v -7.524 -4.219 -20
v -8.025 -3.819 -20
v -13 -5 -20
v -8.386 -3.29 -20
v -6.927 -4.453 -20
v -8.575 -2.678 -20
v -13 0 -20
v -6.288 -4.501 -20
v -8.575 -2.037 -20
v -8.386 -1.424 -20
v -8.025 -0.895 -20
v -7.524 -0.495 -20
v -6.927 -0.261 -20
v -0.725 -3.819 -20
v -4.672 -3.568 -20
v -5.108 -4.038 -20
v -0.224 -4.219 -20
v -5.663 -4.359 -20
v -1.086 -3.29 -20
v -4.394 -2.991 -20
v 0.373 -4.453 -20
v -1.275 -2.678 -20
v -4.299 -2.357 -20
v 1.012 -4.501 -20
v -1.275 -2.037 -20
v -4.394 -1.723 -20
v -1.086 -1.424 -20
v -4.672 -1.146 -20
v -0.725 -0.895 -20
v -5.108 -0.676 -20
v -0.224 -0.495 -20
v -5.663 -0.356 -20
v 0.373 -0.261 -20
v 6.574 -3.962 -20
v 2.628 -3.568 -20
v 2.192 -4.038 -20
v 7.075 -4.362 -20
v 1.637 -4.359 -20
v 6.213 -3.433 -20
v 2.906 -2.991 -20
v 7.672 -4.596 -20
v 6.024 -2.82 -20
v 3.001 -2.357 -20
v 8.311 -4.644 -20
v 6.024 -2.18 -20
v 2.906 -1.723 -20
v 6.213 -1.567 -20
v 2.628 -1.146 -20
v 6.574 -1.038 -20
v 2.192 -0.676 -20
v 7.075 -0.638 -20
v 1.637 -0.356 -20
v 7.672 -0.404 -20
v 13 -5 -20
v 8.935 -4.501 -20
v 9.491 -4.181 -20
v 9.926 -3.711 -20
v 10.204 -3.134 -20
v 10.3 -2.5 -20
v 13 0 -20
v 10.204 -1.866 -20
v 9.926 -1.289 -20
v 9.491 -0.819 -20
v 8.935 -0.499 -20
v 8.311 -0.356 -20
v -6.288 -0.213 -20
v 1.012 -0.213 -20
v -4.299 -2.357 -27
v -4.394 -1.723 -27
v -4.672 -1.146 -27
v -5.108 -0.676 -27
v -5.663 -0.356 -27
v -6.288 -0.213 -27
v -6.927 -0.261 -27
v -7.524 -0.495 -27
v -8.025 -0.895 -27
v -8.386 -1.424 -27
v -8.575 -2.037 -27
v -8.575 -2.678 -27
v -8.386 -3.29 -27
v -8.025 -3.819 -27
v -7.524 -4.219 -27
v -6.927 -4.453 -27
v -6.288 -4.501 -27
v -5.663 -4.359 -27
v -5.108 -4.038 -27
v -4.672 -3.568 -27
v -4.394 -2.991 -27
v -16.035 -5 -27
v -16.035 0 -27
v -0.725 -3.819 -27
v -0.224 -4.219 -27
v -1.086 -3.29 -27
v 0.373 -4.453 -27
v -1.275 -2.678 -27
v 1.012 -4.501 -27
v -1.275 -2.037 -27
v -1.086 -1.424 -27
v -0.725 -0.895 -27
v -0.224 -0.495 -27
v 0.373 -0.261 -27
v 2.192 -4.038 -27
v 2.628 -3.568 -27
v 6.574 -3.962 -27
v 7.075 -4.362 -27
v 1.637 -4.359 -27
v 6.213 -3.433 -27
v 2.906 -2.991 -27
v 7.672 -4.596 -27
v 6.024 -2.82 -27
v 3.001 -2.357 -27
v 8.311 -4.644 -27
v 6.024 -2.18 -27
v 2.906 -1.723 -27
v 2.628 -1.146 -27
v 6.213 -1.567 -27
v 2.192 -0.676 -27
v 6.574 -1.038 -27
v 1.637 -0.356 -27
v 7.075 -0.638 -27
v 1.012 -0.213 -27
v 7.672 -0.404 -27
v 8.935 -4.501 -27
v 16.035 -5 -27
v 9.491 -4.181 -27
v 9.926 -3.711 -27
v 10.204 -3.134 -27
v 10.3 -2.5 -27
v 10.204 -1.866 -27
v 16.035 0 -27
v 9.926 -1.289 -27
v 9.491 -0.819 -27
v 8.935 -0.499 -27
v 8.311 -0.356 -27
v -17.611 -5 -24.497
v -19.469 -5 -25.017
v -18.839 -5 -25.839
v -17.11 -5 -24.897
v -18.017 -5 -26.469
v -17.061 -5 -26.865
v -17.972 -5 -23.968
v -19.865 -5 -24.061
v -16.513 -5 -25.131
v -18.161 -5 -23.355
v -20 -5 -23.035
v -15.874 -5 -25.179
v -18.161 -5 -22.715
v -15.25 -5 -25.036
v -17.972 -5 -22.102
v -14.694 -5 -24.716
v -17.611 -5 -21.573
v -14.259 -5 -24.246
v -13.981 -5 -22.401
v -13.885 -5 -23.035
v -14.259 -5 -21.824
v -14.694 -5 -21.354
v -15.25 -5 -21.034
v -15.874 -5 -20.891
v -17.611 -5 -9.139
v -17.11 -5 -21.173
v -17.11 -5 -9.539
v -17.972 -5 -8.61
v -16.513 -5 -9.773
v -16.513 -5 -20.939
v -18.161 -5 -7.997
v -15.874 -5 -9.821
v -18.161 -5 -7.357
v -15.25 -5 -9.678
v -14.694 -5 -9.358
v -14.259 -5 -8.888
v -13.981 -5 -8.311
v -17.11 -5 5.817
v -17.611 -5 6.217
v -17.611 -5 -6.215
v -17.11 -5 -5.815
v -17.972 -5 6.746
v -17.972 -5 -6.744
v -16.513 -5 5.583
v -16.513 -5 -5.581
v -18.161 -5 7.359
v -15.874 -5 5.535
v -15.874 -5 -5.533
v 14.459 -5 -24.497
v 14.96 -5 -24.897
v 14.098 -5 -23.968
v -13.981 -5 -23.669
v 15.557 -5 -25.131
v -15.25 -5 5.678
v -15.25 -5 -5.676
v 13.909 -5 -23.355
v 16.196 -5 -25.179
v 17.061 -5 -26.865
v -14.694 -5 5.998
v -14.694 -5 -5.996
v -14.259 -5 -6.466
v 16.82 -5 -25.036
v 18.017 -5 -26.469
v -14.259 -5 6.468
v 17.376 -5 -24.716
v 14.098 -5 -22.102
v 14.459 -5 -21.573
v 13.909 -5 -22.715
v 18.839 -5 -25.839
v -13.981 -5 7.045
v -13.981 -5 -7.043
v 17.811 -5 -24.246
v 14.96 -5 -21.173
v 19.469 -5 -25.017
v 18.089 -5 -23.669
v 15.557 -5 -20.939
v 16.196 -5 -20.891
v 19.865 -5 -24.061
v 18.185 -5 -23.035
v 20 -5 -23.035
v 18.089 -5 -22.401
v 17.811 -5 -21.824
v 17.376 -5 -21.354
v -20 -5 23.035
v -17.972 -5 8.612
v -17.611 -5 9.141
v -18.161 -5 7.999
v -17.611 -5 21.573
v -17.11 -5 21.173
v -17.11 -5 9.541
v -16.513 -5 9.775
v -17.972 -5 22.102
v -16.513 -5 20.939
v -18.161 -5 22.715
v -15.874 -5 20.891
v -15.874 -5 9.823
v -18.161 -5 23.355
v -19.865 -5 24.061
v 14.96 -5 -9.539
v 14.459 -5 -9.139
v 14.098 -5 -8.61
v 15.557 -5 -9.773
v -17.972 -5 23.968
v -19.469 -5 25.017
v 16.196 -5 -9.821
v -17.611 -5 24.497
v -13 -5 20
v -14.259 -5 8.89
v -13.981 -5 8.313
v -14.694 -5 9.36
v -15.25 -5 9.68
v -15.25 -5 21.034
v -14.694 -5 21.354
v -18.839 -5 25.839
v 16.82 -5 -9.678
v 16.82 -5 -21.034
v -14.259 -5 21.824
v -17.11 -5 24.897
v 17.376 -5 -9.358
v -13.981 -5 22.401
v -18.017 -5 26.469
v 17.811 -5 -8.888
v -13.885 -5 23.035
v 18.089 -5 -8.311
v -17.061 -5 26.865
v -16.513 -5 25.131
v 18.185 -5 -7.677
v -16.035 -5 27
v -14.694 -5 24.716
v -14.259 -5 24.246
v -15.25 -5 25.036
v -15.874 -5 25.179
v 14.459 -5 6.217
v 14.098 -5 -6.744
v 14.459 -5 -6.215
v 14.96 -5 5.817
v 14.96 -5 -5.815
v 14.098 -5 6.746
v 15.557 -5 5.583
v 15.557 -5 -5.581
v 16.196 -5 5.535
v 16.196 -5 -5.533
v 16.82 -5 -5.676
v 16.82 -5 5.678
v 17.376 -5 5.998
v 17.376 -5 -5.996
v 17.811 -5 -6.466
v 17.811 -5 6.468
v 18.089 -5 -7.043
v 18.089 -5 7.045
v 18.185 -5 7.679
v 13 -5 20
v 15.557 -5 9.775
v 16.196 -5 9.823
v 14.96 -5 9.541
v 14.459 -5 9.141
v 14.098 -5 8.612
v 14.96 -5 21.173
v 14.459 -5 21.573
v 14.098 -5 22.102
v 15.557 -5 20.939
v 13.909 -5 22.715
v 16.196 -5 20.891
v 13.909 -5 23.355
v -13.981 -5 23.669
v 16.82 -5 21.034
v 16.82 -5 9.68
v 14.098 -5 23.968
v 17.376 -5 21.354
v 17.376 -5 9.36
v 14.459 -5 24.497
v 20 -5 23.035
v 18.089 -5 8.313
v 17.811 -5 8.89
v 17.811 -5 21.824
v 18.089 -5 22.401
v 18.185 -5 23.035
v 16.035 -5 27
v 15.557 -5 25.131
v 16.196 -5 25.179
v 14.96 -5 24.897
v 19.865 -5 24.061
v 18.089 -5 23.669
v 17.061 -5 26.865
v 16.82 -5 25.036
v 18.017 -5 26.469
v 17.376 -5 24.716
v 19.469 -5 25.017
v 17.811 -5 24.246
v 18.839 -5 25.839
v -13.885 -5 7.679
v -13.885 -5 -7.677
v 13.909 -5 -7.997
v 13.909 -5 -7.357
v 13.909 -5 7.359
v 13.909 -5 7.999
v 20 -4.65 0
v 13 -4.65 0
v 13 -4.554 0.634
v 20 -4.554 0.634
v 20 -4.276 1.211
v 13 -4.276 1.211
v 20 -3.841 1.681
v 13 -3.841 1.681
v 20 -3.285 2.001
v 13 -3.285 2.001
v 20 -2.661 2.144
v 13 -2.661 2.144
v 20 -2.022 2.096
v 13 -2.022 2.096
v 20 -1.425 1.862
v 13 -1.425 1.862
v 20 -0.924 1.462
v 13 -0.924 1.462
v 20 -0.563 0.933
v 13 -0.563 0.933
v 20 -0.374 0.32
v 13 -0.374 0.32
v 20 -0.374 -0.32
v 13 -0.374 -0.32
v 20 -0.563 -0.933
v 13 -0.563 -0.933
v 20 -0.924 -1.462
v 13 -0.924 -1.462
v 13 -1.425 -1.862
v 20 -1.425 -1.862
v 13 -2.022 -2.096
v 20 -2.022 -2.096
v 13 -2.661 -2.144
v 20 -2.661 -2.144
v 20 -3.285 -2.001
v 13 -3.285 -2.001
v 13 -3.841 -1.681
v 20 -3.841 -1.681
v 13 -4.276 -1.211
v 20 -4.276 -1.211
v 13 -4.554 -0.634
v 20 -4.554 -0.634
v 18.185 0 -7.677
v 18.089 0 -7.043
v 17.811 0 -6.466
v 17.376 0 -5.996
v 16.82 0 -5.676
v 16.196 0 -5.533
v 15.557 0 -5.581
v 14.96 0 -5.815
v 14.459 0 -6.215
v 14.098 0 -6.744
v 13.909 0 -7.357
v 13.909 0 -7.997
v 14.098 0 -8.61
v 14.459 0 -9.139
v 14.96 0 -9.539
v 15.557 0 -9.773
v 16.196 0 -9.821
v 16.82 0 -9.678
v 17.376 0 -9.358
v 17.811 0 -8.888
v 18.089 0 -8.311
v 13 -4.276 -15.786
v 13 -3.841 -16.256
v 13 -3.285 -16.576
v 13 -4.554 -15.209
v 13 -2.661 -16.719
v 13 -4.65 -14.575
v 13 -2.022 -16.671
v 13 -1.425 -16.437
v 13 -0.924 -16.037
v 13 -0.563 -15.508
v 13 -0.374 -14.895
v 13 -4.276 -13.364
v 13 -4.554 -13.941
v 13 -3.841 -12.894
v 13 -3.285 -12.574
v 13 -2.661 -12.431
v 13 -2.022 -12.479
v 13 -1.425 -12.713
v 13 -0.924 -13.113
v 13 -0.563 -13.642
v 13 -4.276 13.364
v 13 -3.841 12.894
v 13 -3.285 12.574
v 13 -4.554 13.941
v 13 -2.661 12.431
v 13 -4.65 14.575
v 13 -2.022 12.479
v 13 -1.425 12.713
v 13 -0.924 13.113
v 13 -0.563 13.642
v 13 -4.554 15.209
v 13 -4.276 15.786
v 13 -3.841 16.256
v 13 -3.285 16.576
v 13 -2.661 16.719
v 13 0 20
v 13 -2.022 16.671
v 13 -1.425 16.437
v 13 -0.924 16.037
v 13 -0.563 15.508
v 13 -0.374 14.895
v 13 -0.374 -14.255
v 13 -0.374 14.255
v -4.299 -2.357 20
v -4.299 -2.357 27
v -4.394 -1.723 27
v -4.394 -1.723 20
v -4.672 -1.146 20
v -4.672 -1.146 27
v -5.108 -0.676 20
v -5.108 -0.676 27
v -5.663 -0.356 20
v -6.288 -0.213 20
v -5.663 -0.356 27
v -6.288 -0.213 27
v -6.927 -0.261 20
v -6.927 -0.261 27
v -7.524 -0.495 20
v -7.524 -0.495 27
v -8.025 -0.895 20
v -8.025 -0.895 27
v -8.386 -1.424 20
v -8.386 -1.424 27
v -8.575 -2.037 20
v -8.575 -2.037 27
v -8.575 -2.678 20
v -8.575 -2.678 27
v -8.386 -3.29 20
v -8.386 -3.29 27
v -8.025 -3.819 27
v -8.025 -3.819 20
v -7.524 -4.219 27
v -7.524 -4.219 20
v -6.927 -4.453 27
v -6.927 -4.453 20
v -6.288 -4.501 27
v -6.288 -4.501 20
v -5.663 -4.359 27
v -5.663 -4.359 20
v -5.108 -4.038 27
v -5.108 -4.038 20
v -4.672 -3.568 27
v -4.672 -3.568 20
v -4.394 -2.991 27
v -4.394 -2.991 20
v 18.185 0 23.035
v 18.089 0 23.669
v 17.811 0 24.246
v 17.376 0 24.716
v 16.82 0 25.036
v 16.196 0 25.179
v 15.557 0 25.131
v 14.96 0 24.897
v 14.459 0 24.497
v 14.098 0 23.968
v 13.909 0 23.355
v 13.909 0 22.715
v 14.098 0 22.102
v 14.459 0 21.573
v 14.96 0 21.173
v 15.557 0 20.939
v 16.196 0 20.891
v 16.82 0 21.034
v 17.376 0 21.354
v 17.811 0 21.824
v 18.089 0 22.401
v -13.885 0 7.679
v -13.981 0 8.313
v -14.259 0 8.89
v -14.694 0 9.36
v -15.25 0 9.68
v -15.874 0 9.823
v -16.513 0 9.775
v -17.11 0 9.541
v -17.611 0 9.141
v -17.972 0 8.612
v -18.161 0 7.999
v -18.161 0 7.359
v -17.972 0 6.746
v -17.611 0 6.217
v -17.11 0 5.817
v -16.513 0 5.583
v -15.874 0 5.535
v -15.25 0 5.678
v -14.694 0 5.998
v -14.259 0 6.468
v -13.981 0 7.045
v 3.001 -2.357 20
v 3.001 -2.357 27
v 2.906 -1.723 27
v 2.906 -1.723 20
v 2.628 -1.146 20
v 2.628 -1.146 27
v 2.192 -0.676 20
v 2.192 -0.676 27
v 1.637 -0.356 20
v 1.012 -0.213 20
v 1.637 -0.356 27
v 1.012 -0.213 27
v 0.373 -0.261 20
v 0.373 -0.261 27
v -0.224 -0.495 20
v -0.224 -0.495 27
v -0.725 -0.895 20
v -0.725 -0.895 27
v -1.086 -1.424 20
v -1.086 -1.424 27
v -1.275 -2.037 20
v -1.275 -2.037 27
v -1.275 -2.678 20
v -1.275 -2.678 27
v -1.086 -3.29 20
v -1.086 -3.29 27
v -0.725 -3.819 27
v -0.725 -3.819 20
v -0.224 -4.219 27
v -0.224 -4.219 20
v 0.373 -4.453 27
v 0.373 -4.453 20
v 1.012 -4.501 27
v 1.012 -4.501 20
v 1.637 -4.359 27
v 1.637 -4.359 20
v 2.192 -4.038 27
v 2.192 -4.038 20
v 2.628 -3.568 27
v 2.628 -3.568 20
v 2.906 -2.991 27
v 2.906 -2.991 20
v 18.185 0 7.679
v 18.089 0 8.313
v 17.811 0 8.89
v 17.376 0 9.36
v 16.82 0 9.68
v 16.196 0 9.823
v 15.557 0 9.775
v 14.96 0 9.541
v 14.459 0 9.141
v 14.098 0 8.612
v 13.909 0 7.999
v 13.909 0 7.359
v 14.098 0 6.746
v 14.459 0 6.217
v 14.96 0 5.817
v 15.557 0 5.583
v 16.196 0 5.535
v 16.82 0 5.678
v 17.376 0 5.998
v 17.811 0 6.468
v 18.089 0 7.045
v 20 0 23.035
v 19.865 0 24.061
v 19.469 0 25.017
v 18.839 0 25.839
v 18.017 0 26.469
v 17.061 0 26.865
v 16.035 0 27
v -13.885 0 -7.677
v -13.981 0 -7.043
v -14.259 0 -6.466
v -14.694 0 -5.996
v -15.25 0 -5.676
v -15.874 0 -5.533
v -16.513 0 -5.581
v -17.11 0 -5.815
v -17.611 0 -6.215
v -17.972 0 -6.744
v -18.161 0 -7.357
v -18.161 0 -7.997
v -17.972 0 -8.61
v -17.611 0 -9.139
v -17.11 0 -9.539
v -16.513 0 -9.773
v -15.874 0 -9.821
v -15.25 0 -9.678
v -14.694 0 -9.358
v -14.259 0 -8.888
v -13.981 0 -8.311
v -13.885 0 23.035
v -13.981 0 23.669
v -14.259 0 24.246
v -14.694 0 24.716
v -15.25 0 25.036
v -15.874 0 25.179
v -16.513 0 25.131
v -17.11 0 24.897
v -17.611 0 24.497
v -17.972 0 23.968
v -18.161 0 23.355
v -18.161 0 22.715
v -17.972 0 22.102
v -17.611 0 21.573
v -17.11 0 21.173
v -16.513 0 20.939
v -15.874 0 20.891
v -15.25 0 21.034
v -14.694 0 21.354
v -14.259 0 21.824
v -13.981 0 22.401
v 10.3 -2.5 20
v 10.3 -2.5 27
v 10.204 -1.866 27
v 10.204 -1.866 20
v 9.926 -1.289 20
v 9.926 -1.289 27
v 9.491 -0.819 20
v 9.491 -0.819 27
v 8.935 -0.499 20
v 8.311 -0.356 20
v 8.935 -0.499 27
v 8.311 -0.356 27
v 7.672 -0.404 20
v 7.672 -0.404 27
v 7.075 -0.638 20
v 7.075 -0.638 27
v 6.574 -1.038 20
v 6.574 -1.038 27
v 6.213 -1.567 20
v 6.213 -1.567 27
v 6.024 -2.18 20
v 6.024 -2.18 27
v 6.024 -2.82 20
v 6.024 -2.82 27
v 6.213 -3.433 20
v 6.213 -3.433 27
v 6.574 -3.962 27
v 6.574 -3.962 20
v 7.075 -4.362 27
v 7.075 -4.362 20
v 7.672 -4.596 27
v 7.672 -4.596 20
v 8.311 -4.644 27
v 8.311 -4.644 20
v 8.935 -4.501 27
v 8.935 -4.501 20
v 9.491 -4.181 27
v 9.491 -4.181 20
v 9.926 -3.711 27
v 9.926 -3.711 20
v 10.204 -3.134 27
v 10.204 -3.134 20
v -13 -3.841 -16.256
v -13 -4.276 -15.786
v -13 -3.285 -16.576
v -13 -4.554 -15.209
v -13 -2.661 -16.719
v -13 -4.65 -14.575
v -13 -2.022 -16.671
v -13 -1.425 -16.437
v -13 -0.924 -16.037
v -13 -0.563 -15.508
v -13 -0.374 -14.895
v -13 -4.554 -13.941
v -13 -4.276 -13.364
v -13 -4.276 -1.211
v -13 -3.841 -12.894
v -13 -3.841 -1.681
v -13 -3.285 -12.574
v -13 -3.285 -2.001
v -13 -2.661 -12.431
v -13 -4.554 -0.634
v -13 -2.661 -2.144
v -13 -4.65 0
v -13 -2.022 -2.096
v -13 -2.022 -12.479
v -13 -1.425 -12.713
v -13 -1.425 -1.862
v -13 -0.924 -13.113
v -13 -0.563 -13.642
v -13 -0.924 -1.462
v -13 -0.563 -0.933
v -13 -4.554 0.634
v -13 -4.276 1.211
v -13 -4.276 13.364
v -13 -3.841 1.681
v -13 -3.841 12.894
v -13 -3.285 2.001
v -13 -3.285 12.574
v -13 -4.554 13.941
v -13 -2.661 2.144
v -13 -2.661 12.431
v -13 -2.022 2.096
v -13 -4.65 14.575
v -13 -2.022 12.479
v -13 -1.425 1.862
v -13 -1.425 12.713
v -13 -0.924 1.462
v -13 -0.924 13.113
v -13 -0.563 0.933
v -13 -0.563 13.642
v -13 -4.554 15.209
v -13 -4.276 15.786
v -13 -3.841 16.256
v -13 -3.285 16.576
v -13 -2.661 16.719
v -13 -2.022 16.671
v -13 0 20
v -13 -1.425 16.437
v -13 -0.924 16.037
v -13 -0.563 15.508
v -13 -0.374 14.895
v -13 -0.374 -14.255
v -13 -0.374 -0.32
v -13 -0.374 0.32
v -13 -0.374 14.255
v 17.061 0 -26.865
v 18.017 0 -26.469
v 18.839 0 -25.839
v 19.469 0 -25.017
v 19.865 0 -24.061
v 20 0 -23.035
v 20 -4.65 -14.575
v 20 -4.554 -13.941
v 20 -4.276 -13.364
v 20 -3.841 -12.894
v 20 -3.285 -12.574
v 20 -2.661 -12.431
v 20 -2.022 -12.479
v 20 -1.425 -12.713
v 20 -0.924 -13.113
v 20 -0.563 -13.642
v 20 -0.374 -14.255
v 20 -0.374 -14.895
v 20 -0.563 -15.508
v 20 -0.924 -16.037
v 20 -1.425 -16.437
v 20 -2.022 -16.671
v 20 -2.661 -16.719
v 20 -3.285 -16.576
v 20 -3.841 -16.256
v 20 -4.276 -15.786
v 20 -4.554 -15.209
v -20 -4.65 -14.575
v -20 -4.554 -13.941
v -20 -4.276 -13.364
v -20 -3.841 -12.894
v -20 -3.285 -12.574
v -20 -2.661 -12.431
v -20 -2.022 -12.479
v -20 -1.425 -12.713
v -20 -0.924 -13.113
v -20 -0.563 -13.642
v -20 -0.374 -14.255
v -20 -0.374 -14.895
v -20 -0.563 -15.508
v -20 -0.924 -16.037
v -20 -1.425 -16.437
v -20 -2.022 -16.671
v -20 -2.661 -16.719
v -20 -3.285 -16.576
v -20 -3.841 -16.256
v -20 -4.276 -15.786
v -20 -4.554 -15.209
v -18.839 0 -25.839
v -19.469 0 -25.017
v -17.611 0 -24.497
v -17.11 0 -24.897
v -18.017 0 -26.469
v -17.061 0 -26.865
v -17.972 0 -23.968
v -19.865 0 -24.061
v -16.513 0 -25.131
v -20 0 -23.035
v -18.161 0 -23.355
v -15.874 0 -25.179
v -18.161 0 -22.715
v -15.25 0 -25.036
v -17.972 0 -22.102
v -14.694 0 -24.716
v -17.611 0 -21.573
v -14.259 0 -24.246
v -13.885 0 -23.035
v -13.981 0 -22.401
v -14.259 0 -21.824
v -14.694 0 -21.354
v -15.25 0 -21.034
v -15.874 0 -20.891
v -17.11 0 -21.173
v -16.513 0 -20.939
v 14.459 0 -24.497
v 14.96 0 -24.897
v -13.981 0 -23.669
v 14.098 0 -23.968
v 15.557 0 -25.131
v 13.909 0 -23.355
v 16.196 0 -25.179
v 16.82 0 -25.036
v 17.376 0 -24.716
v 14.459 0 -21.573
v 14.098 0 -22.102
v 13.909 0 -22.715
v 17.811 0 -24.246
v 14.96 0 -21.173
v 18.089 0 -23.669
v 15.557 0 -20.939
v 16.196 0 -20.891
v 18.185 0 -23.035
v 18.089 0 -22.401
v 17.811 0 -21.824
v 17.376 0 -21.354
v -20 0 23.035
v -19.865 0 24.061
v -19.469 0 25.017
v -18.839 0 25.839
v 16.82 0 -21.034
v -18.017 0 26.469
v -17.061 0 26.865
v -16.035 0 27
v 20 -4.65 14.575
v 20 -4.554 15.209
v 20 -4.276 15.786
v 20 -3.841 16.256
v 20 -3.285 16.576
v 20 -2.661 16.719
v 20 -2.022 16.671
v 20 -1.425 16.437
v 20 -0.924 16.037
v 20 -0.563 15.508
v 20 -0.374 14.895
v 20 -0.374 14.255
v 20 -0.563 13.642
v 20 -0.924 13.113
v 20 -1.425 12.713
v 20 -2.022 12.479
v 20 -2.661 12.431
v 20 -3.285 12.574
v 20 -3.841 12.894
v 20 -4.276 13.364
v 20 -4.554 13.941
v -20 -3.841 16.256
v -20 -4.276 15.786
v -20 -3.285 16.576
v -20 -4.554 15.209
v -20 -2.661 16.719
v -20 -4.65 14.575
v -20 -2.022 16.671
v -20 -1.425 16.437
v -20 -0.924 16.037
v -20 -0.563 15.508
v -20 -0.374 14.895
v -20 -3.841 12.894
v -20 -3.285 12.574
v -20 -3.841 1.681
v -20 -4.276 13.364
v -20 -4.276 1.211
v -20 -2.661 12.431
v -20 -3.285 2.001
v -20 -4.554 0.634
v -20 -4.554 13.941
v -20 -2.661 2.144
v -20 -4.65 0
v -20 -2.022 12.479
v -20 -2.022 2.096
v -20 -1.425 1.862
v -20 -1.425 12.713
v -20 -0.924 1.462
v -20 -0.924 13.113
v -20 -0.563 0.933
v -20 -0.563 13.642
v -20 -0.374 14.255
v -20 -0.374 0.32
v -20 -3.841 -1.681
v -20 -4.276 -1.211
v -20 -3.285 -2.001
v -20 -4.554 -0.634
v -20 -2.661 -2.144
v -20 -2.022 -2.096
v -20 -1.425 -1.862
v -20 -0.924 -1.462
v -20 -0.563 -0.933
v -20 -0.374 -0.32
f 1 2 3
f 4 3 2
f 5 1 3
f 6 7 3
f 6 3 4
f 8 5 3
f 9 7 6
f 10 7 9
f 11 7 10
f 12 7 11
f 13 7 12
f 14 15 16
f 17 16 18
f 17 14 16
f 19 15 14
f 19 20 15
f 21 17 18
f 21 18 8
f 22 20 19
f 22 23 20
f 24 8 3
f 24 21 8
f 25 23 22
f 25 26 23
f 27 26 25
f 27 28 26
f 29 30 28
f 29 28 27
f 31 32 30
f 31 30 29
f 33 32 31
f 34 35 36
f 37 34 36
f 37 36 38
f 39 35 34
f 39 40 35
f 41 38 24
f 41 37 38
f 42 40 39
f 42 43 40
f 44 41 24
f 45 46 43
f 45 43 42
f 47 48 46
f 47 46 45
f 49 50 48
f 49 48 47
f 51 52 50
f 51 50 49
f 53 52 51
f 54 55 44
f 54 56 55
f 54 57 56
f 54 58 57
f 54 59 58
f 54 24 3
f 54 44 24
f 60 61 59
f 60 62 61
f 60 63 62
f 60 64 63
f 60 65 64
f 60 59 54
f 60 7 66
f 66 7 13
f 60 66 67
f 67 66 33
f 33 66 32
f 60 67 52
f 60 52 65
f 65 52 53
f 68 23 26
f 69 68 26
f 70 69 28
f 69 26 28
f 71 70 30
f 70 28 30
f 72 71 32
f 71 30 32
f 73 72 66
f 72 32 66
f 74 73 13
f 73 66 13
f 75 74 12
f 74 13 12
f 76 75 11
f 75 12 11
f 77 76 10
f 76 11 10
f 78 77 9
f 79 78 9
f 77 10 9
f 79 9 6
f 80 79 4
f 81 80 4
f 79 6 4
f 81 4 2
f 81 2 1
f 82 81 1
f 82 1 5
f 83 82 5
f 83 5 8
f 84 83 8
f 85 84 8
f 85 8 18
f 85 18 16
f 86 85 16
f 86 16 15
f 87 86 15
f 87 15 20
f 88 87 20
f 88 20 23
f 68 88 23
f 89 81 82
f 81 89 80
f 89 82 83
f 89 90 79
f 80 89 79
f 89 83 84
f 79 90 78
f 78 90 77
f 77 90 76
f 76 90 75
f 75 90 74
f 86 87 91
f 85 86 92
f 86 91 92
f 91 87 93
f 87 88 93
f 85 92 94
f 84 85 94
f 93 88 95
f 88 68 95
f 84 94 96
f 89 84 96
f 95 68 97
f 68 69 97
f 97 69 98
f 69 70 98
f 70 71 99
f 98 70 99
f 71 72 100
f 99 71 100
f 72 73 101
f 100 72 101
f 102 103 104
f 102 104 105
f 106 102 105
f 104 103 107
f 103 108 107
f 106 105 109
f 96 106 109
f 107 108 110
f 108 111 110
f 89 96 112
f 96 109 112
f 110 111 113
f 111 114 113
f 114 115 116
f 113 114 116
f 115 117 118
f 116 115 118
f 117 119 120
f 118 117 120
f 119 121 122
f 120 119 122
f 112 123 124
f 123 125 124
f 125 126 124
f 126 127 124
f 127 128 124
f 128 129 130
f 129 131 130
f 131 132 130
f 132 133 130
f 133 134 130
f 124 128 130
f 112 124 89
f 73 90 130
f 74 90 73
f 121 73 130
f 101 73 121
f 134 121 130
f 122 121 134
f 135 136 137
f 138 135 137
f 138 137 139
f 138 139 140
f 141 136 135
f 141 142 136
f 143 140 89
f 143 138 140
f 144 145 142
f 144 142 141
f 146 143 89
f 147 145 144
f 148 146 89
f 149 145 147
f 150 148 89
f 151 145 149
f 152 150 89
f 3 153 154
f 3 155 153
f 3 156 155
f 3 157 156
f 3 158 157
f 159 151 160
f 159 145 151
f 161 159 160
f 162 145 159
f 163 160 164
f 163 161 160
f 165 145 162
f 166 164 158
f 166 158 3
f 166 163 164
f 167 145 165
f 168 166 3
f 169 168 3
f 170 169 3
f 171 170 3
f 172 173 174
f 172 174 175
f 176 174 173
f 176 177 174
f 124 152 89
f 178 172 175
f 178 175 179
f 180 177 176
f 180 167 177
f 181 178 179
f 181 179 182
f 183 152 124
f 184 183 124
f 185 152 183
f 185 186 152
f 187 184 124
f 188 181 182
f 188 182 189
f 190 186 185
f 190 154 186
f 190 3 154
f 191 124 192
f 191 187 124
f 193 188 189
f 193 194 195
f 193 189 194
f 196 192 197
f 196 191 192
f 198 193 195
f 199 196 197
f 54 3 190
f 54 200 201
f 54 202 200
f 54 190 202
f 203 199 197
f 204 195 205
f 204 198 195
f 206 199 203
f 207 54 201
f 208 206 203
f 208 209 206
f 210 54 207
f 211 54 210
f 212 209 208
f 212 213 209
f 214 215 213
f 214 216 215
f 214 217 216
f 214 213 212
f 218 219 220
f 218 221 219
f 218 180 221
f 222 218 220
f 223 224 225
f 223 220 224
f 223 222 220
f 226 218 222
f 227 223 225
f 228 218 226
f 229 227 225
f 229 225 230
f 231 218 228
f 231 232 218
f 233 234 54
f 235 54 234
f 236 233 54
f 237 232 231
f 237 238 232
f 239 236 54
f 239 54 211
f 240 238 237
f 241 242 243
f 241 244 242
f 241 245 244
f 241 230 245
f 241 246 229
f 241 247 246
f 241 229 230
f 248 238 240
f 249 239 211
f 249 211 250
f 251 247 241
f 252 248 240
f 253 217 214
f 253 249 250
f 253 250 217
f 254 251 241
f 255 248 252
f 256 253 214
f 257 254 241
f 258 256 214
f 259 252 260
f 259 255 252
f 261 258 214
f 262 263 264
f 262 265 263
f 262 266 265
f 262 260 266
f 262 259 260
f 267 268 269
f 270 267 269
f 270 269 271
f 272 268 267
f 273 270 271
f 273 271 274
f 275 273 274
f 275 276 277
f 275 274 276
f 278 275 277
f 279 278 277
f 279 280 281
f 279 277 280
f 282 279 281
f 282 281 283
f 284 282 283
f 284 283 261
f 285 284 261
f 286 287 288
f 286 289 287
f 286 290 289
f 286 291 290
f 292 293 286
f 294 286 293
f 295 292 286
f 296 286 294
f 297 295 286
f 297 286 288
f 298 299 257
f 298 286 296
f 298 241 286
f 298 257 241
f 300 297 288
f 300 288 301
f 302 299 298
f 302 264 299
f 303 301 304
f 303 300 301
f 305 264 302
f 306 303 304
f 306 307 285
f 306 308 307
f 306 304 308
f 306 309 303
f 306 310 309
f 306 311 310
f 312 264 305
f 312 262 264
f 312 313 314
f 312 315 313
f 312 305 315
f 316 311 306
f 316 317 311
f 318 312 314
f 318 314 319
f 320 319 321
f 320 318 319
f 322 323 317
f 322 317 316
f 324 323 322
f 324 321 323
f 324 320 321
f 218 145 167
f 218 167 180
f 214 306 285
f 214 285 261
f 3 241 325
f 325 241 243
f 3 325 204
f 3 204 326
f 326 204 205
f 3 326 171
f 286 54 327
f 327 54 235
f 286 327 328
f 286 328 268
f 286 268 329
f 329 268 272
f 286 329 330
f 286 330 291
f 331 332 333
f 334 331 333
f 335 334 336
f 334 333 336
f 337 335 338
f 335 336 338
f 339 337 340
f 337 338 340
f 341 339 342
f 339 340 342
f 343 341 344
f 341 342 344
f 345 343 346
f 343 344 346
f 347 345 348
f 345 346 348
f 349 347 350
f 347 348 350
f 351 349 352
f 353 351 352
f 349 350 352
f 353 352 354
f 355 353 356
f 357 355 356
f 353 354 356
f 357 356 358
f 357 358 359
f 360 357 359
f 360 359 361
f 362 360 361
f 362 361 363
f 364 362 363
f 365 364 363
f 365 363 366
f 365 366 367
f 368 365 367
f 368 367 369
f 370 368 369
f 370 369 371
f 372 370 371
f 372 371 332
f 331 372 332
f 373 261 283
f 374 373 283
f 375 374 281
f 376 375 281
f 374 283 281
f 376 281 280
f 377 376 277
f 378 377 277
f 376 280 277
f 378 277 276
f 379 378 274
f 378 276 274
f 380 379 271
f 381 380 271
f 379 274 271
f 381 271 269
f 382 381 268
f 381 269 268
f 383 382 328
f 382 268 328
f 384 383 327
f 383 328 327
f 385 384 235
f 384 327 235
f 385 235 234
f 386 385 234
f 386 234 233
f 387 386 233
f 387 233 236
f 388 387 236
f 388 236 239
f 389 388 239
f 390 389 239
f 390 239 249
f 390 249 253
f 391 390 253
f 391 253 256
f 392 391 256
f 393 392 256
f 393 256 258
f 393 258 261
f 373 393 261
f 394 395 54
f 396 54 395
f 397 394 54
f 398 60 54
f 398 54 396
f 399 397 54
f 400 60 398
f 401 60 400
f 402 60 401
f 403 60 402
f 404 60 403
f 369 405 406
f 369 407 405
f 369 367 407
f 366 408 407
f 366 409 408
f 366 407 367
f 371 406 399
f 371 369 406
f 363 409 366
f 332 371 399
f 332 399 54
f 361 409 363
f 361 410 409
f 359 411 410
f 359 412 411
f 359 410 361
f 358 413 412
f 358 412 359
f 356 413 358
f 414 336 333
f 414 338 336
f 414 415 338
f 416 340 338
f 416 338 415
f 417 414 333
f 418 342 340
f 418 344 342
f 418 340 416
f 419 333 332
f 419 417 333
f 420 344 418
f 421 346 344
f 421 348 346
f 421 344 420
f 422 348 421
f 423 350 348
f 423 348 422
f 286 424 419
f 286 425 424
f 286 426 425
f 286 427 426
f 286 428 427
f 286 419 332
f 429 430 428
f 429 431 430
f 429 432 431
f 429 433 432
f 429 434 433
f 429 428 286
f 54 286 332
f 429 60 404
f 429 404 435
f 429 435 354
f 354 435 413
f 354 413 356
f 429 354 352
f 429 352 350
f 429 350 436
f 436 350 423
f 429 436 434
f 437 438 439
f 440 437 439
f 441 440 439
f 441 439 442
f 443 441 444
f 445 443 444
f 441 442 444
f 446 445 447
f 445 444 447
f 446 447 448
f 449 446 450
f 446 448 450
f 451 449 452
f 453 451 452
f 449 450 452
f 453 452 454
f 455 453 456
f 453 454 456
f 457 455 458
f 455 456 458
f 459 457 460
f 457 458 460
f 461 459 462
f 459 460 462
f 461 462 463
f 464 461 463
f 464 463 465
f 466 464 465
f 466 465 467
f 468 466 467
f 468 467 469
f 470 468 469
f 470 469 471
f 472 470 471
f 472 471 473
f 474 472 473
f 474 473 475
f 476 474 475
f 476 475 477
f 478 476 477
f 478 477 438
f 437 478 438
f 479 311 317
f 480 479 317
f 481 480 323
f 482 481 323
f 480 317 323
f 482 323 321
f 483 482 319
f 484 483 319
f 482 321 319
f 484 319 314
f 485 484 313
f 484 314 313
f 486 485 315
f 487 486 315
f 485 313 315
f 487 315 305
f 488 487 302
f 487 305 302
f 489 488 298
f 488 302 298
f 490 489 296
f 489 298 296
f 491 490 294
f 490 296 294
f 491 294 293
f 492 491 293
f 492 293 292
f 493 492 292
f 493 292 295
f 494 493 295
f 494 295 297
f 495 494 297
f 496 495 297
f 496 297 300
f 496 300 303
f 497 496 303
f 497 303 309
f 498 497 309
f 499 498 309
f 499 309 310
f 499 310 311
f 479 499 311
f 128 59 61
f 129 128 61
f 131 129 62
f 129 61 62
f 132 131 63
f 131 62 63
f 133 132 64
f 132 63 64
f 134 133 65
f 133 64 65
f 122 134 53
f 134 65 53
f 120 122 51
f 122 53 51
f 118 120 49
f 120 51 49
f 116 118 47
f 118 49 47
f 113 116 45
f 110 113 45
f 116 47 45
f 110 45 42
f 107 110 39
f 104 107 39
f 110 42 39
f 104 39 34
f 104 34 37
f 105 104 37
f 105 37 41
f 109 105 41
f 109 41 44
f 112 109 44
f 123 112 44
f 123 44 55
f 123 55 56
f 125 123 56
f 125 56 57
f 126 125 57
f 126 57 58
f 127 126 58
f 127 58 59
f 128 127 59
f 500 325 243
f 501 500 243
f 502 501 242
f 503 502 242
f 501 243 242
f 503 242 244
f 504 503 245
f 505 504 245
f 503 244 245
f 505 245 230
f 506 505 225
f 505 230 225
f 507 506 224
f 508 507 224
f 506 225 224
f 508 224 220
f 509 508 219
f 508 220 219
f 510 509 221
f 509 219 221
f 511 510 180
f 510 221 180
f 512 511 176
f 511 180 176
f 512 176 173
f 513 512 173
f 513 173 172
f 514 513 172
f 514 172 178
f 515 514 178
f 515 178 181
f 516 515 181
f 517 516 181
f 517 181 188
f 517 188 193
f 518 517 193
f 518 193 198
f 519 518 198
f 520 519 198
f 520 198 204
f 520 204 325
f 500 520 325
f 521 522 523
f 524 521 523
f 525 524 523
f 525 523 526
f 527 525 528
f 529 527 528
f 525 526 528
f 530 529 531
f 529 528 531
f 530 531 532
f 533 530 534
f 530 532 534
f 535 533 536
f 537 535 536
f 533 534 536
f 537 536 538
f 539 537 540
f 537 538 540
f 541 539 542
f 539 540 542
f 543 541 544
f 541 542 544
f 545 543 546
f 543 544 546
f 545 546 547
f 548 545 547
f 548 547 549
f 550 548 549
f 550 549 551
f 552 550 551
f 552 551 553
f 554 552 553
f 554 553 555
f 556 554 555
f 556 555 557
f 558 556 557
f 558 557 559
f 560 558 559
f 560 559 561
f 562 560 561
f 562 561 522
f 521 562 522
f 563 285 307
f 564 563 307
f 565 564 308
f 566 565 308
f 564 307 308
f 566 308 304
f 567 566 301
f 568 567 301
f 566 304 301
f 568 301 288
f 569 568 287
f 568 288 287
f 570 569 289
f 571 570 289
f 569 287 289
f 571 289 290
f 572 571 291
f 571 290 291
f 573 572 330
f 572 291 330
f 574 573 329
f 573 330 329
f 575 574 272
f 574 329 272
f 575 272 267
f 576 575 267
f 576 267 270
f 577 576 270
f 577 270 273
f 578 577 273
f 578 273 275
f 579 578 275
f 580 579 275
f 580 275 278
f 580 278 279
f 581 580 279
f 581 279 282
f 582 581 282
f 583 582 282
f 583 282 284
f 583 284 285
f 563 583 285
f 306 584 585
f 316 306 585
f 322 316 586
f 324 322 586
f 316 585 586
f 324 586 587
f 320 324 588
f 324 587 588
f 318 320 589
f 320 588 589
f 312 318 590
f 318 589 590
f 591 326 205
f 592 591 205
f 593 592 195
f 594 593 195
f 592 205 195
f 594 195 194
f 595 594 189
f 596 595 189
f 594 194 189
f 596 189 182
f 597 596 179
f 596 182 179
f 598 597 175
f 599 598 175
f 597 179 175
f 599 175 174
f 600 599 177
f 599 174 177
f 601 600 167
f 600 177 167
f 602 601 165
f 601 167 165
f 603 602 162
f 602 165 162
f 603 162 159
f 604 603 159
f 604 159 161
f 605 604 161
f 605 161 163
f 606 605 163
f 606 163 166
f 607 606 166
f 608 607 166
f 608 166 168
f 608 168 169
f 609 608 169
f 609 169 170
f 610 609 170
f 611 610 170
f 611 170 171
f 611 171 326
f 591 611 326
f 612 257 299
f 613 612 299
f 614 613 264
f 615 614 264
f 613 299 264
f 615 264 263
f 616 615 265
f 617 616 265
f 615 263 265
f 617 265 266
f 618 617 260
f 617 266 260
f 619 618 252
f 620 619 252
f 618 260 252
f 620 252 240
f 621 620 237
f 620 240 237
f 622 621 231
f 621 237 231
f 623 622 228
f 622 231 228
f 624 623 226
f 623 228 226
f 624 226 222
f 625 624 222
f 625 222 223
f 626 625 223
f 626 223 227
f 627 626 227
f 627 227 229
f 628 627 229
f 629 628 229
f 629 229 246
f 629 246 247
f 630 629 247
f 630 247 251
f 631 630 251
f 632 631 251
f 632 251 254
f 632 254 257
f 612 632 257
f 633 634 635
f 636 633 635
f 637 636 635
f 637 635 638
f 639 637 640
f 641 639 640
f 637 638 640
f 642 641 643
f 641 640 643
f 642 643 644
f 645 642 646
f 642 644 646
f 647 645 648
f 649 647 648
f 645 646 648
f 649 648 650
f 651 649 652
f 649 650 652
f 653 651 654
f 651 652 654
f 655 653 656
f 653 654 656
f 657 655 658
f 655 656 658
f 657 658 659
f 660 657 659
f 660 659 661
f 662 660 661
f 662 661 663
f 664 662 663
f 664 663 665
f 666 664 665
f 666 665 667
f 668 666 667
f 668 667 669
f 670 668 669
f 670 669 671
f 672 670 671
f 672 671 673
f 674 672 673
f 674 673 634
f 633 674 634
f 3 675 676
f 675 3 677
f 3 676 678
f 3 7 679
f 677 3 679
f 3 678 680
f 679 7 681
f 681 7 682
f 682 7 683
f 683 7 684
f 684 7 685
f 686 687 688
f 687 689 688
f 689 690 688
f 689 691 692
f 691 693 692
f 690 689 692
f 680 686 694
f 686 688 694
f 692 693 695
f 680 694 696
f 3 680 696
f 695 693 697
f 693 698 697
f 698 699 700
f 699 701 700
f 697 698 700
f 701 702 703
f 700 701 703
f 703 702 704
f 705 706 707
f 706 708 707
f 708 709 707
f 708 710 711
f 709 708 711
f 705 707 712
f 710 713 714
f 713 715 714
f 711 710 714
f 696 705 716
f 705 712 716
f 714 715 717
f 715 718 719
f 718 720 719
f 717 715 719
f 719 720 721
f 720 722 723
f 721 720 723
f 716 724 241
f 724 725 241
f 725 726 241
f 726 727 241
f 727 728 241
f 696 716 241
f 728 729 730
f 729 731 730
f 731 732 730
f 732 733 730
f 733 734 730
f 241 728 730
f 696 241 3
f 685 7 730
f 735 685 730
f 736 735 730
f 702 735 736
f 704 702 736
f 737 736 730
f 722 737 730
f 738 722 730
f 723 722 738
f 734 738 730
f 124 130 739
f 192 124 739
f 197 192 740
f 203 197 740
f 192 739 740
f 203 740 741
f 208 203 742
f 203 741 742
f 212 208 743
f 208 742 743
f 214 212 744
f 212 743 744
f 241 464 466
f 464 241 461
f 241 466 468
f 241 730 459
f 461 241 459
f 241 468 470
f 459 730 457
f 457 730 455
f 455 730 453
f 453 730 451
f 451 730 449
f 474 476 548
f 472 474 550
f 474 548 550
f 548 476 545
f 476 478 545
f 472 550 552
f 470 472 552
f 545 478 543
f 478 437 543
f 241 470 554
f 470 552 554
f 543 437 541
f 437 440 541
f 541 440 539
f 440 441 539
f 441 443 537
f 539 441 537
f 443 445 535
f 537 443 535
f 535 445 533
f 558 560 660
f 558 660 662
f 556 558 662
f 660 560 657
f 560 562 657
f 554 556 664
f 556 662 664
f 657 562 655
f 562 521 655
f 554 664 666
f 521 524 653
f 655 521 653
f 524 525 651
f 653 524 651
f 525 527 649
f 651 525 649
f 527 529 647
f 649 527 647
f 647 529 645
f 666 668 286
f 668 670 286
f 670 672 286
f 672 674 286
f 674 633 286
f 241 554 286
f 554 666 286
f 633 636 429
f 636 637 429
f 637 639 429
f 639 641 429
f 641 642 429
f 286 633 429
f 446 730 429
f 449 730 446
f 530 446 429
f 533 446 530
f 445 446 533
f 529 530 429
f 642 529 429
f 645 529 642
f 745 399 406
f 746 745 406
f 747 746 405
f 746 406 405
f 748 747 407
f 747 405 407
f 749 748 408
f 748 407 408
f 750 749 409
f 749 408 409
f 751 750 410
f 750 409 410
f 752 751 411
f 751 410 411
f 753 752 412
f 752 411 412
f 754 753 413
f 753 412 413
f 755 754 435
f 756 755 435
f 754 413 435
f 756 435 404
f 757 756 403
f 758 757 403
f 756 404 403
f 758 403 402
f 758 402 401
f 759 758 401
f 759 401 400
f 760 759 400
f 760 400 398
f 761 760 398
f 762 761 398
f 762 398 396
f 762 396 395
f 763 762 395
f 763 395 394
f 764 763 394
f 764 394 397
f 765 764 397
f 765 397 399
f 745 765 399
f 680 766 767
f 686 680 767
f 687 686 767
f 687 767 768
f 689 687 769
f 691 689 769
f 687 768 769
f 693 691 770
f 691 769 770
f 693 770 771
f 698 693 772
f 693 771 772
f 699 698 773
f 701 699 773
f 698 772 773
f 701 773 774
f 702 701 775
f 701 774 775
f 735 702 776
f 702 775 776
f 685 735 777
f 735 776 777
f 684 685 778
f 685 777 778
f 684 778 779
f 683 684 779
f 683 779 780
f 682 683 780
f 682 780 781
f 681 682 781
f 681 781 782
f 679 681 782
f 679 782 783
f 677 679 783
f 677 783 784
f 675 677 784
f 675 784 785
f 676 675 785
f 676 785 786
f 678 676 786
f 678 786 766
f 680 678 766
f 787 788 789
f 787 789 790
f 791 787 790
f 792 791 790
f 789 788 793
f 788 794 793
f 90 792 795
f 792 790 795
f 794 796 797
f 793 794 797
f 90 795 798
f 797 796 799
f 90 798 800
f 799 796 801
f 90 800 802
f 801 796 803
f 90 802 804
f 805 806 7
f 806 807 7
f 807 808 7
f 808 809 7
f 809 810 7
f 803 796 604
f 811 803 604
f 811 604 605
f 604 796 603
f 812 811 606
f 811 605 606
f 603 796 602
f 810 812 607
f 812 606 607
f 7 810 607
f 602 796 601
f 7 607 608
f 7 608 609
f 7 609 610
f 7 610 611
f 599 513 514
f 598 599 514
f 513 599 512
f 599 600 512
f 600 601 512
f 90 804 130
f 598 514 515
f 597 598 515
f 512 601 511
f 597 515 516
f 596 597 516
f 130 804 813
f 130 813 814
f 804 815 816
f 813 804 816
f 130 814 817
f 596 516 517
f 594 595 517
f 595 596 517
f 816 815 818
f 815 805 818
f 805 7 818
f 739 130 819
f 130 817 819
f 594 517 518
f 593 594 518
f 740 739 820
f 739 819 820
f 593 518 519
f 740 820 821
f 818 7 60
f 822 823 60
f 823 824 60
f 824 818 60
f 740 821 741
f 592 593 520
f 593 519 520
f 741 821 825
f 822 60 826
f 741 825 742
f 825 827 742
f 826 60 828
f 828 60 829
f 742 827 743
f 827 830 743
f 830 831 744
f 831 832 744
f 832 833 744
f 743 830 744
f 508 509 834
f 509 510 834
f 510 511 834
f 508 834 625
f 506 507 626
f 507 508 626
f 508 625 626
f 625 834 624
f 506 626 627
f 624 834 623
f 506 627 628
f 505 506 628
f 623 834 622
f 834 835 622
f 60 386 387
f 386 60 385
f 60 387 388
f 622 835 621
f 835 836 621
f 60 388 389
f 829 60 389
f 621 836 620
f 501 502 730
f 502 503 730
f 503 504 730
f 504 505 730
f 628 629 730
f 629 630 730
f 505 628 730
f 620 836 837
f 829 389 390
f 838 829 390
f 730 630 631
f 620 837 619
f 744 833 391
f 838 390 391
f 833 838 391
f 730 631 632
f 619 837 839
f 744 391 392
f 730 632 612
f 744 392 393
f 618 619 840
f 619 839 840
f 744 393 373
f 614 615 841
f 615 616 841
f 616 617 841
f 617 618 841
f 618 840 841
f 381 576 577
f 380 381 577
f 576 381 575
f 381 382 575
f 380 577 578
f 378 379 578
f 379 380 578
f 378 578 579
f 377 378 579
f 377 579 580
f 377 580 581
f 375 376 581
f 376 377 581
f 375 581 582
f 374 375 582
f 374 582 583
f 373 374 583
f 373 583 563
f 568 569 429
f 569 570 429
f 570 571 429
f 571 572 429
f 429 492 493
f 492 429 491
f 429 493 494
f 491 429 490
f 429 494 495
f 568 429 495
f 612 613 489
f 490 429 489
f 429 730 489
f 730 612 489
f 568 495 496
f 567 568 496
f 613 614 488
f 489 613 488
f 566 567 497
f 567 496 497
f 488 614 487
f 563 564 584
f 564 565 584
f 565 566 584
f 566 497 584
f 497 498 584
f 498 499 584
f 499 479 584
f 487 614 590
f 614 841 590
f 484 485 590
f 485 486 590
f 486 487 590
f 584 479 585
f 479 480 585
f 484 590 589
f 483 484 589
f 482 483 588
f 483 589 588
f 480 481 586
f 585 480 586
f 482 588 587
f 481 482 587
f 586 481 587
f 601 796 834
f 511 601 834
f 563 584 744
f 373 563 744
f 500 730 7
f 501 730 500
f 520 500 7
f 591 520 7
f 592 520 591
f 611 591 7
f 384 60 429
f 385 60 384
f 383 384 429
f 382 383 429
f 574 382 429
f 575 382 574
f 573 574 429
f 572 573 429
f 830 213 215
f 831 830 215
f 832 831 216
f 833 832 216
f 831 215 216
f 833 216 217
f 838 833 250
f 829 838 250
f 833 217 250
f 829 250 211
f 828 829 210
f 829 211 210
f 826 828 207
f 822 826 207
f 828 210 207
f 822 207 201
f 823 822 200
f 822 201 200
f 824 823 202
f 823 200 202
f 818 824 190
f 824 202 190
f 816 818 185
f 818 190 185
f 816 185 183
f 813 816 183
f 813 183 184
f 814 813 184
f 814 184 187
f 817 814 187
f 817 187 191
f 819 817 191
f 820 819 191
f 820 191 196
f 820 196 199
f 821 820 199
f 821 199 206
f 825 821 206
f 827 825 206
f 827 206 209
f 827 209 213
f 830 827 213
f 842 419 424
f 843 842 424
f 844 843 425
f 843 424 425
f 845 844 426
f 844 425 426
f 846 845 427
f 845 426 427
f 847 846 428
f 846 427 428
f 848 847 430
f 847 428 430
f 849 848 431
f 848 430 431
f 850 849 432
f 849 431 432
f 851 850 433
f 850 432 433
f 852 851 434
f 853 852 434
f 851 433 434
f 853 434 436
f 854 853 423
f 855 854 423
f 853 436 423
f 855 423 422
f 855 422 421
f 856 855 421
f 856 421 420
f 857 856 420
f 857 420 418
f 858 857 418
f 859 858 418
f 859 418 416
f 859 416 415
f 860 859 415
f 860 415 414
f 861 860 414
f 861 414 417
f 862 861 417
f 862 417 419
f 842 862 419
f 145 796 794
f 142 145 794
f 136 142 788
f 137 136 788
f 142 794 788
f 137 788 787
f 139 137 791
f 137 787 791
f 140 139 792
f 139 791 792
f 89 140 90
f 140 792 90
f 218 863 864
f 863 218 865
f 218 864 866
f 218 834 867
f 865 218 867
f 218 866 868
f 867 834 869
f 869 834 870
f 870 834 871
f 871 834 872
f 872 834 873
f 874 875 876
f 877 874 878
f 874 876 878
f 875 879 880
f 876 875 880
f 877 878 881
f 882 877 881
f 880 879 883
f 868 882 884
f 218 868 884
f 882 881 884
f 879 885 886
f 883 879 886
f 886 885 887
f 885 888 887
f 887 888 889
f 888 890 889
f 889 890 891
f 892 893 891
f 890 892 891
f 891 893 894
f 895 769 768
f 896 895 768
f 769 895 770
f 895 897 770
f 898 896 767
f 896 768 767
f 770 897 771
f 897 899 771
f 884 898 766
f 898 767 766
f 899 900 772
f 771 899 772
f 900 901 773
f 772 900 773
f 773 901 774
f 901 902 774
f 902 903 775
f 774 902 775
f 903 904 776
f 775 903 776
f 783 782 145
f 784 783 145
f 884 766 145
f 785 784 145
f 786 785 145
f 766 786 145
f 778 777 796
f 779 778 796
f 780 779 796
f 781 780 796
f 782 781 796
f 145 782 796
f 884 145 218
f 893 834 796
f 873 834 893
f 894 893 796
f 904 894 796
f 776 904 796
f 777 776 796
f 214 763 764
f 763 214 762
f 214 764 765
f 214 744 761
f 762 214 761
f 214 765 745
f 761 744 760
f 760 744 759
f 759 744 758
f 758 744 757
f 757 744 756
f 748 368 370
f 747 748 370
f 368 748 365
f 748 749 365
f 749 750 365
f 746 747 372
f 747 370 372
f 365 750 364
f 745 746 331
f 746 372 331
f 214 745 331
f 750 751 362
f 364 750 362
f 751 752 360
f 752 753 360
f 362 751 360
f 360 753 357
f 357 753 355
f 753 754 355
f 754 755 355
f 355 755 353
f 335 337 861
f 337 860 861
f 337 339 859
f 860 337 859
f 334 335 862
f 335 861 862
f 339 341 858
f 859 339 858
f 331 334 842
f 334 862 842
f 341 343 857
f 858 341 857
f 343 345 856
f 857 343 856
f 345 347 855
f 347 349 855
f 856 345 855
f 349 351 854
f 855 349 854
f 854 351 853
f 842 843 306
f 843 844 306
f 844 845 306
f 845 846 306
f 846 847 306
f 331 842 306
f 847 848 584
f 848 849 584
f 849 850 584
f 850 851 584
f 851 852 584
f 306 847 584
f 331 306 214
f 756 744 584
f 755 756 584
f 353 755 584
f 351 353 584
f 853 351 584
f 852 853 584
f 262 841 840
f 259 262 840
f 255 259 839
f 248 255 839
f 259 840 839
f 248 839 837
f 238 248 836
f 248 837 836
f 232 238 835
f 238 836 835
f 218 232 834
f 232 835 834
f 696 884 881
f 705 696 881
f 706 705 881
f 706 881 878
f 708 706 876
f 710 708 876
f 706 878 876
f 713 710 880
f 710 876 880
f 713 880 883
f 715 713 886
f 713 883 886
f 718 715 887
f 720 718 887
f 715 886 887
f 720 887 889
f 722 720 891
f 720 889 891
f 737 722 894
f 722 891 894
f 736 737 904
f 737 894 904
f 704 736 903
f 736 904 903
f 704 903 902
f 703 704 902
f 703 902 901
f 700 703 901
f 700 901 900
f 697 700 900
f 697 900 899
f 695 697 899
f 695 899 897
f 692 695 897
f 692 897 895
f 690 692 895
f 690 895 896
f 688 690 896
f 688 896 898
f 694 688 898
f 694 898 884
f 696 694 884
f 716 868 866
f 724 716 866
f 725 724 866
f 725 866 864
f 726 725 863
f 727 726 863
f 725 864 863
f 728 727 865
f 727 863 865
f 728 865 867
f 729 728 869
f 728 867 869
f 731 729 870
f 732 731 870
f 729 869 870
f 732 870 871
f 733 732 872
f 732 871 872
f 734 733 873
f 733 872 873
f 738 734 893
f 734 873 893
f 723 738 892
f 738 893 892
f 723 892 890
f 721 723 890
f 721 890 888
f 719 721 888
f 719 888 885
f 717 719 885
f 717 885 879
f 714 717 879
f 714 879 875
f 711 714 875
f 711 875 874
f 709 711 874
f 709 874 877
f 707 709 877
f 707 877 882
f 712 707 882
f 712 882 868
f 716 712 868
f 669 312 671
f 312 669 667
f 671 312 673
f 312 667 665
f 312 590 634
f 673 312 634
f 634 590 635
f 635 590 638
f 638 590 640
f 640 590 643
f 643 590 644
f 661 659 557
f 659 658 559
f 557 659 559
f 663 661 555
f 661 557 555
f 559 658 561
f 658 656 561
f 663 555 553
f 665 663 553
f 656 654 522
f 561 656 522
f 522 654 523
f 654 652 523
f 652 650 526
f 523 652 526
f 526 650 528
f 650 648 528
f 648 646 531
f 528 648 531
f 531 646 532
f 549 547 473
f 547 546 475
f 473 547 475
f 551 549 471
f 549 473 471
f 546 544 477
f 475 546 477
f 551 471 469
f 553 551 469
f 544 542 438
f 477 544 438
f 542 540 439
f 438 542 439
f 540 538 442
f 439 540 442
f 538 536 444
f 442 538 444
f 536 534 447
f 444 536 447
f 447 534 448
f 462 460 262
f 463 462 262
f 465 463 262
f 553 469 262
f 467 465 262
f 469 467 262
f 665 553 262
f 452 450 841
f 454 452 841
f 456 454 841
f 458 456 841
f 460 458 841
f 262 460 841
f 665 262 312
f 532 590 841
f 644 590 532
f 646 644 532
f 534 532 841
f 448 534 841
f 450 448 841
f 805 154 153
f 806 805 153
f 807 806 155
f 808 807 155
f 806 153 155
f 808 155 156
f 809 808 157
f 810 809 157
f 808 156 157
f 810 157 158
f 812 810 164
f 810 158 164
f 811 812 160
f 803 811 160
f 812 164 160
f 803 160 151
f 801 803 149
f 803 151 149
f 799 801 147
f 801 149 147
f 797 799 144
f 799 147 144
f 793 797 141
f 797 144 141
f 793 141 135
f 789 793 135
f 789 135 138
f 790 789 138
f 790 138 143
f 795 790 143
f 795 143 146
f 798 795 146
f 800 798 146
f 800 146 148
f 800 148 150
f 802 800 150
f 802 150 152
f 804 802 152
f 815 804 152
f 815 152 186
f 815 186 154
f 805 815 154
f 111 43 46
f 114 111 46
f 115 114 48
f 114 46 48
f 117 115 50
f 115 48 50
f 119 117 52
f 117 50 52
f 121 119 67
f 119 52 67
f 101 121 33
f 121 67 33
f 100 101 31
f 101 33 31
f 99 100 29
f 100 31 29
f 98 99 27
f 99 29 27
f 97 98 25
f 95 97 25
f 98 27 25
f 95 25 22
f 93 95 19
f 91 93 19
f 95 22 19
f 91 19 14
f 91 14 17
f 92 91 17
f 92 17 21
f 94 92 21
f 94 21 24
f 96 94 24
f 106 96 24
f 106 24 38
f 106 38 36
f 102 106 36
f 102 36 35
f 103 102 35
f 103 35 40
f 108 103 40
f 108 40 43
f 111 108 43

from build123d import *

# Parameters (mm, degrees)
F0_W     = 26
F0_H     = 40
F1_DEPTH = 5
F2_R     = 2.15
F3_DEPTH = 5.001
F4_R     = 2.15
F5_DEPTH = 54.001
F6_R     = 2.15
F7_DEPTH = 40.001


with BuildPart() as f1:
    # F0 (on Front) → F1 (new body)
    with BuildSketch(Plane.XZ):
        with BuildLine():
            ThreePointArc((20, 23.035), (18.838678, 25.838678), (16.035, 27))
            Line((16.035, 27), (-16.035, 27))
            ThreePointArc((-16.035, 27), (-18.838678, 25.838678), (-20, 23.035))
            Line((-20, 23.035), (-20, -23.035))
            ThreePointArc((-20, -23.035), (-18.838678, -25.838678), (-16.035, -27))
            Line((-16.035, -27), (16.035, -27))
            ThreePointArc((16.035, -27), (18.838678, -25.838678), (20, -23.035))
            Line((20, -23.035), (20, 23.035))
        make_face()
        Rectangle(F0_W, F0_H, mode=Mode.SUBTRACT)
    extrude(amount=F1_DEPTH)

    # F2 (on face) → F3 (cut, through all)
    with BuildSketch(Plane.XZ.offset(5)):
        with Locations((-16.035, -23.035)):
            Circle(F2_R)
        with Locations((-16.035, -7.677)):
            Circle(F2_R)
        with Locations((-16.035, 7.679)):
            Circle(F2_R)
        with Locations((-16.035, 23.035)):
            Circle(F2_R)
        with Locations((16.035, 23.035)):
            Circle(F2_R)
        with Locations((16.035, 7.679)):
            Circle(F2_R)
        with Locations((16.035, -7.677)):
            Circle(F2_R)
        with Locations((16.035, -23.035)):
            Circle(F2_R)
    extrude(amount=-F3_DEPTH, mode=Mode.SUBTRACT)

    # F4 (on face) → F5 (cut, through all)
    with BuildSketch(Plane.XY.offset(27)):
        with Locations((8.15, -2.5)):
            Circle(F4_R)
        with Locations((0.851398, -2.357123)):
            Circle(F4_R)
        with Locations((-6.448602, -2.357123)):
            Circle(F4_R)
    extrude(amount=-F5_DEPTH, mode=Mode.SUBTRACT)

    # F6 (on face) → F7 (cut, through all)
    with BuildSketch(Plane(origin=(-20, 0, 0), x_dir=(0, -1, 0), z_dir=(-1, 0, 0))):
        with Locations((2.5, 14.575)):
            Circle(F6_R)
        with Locations((2.5, 0)):
            Circle(F6_R)
        with Locations((2.5, -14.575)):
            Circle(F6_R)
    extrude(amount=-F7_DEPTH, mode=Mode.SUBTRACT)


solid = f1.part
